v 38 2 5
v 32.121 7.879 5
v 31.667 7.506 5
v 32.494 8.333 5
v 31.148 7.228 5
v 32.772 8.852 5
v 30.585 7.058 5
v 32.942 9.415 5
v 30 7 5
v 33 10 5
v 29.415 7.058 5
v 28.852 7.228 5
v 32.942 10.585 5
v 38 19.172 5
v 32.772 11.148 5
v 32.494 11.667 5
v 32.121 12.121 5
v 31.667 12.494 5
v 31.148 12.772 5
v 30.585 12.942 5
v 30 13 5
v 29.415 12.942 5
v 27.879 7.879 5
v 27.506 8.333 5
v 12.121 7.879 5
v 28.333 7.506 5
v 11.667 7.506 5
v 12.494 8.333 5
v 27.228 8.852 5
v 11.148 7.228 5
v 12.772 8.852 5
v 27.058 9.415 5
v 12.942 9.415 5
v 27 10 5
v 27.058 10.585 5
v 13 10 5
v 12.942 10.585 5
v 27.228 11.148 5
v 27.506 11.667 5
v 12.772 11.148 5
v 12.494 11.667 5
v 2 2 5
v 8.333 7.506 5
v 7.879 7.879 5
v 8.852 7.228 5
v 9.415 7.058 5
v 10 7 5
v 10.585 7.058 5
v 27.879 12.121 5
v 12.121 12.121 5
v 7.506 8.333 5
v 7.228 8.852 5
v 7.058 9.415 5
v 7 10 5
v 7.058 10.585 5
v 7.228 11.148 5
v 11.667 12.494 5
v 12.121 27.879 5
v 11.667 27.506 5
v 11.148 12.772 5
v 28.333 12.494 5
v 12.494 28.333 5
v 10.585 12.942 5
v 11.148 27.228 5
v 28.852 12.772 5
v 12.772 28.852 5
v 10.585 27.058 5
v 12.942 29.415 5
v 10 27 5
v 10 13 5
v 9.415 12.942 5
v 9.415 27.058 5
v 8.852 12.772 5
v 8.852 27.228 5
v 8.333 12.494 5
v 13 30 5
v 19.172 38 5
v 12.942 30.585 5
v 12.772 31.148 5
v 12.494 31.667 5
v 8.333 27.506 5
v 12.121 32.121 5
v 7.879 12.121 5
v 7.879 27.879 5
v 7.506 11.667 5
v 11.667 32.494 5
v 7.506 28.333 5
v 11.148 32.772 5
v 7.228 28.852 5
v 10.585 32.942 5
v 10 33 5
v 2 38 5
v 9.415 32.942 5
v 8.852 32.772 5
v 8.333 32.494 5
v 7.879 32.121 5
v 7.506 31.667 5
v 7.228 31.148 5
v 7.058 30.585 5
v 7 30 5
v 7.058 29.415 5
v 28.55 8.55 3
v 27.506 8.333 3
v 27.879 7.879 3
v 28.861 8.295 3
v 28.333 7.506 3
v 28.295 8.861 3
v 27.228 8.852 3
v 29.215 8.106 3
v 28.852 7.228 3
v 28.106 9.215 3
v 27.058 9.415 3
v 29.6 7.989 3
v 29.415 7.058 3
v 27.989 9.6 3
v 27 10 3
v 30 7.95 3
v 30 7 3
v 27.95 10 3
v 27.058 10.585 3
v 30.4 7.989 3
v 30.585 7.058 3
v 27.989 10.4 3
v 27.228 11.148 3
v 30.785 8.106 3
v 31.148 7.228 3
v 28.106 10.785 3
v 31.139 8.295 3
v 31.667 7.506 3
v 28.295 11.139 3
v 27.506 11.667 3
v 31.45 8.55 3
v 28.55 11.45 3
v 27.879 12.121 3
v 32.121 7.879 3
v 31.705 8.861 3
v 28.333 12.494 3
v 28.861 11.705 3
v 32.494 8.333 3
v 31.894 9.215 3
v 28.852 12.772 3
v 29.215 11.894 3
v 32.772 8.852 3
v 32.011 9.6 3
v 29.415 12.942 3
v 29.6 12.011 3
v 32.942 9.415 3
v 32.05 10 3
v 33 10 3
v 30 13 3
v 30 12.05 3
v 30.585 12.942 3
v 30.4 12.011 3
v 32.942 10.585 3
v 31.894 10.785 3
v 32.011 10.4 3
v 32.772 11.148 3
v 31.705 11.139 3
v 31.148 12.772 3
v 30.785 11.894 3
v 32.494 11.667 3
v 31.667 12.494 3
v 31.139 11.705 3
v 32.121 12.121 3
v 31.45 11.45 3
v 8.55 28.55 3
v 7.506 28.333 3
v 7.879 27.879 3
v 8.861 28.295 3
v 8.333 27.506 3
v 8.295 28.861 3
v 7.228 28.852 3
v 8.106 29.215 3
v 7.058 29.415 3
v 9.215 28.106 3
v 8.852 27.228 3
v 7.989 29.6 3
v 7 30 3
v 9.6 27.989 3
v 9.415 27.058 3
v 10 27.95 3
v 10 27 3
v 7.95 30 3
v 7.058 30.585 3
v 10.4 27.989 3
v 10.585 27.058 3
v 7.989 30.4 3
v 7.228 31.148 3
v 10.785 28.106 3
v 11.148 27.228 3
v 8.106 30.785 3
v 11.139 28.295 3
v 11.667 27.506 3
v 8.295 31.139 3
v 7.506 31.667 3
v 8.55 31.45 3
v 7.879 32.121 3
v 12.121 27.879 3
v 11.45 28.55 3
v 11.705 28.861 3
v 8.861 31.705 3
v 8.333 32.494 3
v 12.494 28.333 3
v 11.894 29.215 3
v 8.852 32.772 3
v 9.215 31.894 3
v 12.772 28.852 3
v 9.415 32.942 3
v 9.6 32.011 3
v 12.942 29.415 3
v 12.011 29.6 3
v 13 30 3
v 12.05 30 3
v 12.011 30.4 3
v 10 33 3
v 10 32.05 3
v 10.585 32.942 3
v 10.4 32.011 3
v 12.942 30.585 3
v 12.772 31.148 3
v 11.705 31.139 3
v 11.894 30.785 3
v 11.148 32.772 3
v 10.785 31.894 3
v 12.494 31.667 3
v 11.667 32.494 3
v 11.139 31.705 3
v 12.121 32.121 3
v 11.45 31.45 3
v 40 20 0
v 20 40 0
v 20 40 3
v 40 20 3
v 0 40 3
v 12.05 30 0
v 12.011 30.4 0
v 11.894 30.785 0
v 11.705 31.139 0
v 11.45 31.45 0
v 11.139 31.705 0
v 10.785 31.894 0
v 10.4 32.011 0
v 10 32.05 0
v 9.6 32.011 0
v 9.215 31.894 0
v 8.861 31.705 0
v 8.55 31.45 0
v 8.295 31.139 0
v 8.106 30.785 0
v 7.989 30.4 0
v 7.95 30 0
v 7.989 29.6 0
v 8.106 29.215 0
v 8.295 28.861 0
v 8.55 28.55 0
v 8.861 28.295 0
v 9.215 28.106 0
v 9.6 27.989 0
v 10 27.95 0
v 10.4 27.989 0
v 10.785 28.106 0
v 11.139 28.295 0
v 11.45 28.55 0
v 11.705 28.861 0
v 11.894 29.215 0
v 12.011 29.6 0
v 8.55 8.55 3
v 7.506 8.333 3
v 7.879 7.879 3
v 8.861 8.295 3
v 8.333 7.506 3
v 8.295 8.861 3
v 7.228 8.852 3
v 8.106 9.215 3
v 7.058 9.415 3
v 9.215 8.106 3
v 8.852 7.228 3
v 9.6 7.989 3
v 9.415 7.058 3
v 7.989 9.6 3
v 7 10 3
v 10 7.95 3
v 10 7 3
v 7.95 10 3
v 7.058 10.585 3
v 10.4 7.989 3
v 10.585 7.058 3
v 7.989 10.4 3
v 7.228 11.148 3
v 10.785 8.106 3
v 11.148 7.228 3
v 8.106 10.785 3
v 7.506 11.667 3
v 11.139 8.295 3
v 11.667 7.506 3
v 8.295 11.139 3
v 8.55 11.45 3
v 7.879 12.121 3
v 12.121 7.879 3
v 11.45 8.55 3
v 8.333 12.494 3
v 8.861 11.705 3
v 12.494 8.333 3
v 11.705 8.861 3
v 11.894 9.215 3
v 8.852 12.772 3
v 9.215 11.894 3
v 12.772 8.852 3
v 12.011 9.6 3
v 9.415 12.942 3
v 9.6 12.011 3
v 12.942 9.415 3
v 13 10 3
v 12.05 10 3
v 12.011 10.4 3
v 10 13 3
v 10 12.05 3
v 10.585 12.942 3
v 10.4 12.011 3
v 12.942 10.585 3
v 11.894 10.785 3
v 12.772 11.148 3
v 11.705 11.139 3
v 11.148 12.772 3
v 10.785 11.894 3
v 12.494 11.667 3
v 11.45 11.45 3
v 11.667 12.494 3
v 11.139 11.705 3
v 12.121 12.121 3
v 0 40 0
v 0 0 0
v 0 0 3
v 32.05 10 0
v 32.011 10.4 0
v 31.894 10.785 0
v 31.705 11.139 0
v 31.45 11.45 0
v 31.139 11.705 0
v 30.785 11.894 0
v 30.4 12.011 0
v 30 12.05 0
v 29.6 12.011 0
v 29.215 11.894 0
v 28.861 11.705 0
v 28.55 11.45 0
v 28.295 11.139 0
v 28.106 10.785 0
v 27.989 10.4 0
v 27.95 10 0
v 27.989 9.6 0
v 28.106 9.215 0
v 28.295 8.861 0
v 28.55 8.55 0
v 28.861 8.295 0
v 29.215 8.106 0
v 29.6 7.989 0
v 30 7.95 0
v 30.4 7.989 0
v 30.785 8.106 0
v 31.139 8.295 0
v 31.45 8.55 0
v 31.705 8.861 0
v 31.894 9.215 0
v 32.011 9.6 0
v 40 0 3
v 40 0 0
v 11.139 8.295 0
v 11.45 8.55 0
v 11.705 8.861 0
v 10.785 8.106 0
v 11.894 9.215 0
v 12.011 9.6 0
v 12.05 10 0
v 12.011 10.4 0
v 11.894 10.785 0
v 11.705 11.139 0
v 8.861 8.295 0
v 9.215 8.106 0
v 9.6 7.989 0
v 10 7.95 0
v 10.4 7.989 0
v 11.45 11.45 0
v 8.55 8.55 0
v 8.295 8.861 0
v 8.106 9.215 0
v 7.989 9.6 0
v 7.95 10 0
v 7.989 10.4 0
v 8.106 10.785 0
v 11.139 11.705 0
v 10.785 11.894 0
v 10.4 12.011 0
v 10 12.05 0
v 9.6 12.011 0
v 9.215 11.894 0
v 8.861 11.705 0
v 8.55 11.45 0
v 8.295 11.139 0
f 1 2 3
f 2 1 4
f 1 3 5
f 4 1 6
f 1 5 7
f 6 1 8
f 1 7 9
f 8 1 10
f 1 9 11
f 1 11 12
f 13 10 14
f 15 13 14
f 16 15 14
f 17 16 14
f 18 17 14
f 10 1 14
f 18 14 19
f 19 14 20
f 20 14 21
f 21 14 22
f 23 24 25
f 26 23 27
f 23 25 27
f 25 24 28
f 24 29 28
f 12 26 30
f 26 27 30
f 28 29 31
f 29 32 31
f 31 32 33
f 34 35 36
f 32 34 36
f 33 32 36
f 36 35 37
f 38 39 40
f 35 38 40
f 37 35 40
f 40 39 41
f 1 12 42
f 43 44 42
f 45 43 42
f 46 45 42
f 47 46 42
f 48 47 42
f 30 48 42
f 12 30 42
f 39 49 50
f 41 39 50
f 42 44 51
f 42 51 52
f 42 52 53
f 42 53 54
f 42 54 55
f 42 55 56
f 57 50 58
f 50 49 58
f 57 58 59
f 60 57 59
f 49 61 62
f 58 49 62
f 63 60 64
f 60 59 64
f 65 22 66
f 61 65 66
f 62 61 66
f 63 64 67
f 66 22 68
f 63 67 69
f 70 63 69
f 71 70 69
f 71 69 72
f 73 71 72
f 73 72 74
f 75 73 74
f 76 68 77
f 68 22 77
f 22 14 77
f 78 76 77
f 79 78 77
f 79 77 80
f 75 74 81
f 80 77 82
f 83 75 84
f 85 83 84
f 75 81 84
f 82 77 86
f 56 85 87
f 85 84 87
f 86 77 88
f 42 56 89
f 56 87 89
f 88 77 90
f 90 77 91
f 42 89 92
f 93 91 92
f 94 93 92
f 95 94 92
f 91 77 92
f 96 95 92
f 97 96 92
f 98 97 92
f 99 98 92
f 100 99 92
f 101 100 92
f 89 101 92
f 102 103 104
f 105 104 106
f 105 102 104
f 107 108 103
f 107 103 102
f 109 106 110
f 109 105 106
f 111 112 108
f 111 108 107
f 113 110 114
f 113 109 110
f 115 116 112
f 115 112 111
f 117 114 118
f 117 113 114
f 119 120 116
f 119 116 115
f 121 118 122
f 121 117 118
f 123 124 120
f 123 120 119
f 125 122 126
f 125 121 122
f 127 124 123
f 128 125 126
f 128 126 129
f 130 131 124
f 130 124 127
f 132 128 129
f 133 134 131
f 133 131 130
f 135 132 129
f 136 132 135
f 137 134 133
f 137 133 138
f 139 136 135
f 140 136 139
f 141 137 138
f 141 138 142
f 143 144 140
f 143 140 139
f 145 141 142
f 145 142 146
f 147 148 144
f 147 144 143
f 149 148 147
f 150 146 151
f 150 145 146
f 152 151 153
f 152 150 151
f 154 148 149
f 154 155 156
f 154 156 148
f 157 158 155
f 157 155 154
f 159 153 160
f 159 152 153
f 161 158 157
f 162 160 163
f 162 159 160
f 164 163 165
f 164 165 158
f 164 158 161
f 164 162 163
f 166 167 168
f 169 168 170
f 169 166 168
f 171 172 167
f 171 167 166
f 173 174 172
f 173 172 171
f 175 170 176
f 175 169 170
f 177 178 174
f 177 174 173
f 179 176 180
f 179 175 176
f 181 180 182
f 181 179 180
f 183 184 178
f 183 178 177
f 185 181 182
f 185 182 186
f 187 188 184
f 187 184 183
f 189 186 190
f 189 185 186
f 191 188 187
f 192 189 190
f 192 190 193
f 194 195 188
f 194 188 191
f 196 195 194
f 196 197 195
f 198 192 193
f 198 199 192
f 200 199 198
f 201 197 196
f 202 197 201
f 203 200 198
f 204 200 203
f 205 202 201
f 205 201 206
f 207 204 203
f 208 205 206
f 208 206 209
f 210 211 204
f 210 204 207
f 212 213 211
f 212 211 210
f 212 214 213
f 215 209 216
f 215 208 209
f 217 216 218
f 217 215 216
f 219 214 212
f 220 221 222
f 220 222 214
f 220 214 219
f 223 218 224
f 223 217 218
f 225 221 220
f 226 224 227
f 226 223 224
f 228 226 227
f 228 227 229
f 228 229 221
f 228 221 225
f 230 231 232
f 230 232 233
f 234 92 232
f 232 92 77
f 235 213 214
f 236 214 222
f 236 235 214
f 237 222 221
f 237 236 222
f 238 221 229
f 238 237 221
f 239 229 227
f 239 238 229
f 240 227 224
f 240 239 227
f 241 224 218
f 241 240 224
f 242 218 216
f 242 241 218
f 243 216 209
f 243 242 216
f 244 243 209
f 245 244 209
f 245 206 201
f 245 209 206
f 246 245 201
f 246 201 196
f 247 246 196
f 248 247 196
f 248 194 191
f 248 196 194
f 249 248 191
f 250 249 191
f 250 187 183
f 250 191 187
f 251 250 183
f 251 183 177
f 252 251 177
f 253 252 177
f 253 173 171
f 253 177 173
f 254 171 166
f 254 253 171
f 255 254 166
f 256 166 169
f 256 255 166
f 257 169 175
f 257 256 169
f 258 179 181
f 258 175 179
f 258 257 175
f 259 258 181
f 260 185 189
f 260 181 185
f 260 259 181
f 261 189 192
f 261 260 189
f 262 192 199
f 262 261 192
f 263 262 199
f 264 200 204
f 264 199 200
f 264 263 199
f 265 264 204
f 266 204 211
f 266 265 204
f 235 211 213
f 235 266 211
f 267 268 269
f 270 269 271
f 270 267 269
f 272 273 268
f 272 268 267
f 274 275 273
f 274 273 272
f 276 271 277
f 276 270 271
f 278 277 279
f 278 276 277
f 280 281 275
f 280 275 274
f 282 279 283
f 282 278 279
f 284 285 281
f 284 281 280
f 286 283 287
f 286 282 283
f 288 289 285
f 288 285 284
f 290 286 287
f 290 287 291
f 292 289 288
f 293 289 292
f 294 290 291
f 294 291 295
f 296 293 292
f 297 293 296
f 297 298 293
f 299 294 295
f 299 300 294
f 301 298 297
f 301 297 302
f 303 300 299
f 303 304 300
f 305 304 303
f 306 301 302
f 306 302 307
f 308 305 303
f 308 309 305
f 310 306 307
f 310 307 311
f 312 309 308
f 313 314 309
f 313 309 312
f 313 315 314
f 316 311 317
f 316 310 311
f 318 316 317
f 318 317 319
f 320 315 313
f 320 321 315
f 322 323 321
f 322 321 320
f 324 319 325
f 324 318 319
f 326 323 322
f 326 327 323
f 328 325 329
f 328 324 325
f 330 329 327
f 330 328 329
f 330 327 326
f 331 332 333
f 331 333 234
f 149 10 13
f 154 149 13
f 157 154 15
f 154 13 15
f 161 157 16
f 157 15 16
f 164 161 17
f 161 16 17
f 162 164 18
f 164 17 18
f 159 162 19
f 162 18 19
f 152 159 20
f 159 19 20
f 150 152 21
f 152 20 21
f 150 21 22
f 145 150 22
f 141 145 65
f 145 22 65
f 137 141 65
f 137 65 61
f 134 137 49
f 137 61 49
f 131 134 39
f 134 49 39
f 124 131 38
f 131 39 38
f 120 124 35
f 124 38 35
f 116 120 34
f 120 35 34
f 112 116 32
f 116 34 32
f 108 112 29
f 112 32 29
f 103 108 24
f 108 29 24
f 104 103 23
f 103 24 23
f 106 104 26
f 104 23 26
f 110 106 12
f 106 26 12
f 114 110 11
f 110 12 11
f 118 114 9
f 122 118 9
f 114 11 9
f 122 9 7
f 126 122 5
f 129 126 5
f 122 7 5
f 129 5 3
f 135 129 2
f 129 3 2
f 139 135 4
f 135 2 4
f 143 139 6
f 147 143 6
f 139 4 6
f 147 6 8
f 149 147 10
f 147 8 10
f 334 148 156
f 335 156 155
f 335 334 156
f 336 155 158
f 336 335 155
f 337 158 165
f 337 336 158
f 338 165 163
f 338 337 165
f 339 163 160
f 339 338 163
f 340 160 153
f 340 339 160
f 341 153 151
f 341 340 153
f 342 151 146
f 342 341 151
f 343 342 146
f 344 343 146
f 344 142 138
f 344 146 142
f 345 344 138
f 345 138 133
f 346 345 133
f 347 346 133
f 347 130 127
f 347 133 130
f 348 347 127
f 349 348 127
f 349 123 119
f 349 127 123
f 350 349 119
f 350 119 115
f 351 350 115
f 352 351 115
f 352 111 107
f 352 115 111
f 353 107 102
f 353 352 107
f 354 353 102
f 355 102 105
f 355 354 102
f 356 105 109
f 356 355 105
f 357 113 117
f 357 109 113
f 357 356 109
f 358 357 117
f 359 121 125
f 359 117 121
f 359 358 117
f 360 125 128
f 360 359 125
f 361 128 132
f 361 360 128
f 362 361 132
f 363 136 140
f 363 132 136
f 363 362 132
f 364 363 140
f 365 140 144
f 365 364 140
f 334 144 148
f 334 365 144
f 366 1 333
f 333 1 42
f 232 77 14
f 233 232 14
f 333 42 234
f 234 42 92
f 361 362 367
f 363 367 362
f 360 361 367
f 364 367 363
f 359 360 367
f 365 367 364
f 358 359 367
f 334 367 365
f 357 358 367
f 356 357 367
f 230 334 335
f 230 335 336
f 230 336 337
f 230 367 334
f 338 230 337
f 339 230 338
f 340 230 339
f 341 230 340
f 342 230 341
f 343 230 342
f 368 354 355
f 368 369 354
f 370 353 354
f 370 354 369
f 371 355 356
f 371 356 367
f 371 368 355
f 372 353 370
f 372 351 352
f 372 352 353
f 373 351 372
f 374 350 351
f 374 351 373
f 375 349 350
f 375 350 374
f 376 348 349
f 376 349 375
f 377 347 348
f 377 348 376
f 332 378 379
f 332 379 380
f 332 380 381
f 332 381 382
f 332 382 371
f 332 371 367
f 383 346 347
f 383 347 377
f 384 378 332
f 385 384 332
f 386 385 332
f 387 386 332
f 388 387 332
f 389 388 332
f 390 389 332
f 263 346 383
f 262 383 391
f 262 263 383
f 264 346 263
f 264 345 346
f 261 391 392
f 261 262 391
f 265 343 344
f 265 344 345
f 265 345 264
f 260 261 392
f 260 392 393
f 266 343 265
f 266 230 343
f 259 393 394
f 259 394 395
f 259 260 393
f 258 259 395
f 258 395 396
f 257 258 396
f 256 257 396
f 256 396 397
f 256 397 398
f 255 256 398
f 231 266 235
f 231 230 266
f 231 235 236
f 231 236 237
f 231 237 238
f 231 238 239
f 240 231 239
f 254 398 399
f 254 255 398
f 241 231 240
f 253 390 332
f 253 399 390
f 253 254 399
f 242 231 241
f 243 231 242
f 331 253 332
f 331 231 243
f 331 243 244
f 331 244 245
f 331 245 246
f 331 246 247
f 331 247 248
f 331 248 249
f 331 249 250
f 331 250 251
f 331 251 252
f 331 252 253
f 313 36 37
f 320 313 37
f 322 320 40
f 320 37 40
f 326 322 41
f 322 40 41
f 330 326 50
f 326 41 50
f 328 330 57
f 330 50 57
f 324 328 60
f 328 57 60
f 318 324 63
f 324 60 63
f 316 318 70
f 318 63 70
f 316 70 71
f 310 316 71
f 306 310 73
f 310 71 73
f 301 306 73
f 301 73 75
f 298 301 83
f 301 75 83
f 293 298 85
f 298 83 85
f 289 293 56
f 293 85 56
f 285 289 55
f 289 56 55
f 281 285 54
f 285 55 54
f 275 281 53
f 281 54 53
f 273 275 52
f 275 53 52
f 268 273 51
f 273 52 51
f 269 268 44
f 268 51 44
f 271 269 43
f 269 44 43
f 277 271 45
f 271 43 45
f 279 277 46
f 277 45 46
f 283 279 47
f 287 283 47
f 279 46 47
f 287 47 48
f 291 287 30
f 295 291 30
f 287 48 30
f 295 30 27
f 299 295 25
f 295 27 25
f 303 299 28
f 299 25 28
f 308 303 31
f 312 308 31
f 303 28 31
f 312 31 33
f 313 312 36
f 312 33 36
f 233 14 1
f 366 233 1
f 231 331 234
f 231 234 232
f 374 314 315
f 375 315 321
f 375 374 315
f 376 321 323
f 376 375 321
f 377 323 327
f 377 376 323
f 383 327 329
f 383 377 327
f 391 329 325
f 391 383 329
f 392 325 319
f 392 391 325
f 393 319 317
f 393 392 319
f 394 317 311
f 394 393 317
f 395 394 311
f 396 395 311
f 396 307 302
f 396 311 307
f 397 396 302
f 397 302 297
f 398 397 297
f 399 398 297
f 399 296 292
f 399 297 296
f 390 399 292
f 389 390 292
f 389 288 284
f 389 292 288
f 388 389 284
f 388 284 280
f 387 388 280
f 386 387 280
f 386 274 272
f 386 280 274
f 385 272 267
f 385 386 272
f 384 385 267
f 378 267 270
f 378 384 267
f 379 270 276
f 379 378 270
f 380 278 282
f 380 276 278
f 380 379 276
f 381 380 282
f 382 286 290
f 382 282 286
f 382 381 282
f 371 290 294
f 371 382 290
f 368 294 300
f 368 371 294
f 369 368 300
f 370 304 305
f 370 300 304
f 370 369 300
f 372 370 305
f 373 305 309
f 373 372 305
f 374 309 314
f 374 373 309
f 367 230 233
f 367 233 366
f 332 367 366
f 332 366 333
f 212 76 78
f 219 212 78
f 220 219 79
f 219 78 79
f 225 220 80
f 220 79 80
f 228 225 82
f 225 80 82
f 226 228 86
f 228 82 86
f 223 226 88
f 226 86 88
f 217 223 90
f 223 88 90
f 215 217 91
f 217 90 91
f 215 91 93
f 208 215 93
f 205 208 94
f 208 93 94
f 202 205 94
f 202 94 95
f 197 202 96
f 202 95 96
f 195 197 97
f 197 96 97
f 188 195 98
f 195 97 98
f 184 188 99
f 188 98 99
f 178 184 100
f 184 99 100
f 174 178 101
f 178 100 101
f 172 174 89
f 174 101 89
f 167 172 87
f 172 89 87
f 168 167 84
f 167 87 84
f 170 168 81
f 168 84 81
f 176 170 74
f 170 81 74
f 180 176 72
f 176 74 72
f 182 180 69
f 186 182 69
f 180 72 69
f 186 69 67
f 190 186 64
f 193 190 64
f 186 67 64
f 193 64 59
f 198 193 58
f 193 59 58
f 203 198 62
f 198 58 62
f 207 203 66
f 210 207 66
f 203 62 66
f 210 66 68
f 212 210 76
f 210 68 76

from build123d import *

# Parameters (mm, degrees)
SKETCH_R         = 2.05
EXTRUDE001_DEPTH = 5
CHAMFER_SIZE     = 2
SKETCH001_R      = 3
POCKET_DEPTH     = 2


with BuildPart() as part:
    # Sketch → Extrude001 (new body)
    with BuildSketch(Plane.XY):
        Polygon((0, 0), (0, 40), (20, 40), (40, 20), (40, 0), align=None)
        with Locations((10, 10)):
            Circle(SKETCH_R, mode=Mode.SUBTRACT)
        with Locations((10, 30)):
            Circle(SKETCH_R, mode=Mode.SUBTRACT)
        with Locations((30, 10)):
            Circle(SKETCH_R, mode=Mode.SUBTRACT)
    extrude(amount=EXTRUDE001_DEPTH)

    # Chamfer
    chamfer_edges = [part.edges().sort_by_distance(p)[0] for p in [
        (0, 20, 5),
        (10, 40, 5),
        (30, 30, 5),
        (40, 10, 5),
        (20, 0, 5),
    ]]
    chamfer(chamfer_edges, length=CHAMFER_SIZE)

    # Sketch001 → Pocket (cut)
    with BuildSketch(Plane.XY.offset(5)):
        with Locations((10, 30)):
            Circle(SKETCH001_R)
        with Locations((10, 10)):
            Circle(SKETCH001_R)
        with Locations((30, 10)):
            Circle(SKETCH001_R)
    extrude(amount=-POCKET_DEPTH, mode=Mode.SUBTRACT)


solid = part.part
